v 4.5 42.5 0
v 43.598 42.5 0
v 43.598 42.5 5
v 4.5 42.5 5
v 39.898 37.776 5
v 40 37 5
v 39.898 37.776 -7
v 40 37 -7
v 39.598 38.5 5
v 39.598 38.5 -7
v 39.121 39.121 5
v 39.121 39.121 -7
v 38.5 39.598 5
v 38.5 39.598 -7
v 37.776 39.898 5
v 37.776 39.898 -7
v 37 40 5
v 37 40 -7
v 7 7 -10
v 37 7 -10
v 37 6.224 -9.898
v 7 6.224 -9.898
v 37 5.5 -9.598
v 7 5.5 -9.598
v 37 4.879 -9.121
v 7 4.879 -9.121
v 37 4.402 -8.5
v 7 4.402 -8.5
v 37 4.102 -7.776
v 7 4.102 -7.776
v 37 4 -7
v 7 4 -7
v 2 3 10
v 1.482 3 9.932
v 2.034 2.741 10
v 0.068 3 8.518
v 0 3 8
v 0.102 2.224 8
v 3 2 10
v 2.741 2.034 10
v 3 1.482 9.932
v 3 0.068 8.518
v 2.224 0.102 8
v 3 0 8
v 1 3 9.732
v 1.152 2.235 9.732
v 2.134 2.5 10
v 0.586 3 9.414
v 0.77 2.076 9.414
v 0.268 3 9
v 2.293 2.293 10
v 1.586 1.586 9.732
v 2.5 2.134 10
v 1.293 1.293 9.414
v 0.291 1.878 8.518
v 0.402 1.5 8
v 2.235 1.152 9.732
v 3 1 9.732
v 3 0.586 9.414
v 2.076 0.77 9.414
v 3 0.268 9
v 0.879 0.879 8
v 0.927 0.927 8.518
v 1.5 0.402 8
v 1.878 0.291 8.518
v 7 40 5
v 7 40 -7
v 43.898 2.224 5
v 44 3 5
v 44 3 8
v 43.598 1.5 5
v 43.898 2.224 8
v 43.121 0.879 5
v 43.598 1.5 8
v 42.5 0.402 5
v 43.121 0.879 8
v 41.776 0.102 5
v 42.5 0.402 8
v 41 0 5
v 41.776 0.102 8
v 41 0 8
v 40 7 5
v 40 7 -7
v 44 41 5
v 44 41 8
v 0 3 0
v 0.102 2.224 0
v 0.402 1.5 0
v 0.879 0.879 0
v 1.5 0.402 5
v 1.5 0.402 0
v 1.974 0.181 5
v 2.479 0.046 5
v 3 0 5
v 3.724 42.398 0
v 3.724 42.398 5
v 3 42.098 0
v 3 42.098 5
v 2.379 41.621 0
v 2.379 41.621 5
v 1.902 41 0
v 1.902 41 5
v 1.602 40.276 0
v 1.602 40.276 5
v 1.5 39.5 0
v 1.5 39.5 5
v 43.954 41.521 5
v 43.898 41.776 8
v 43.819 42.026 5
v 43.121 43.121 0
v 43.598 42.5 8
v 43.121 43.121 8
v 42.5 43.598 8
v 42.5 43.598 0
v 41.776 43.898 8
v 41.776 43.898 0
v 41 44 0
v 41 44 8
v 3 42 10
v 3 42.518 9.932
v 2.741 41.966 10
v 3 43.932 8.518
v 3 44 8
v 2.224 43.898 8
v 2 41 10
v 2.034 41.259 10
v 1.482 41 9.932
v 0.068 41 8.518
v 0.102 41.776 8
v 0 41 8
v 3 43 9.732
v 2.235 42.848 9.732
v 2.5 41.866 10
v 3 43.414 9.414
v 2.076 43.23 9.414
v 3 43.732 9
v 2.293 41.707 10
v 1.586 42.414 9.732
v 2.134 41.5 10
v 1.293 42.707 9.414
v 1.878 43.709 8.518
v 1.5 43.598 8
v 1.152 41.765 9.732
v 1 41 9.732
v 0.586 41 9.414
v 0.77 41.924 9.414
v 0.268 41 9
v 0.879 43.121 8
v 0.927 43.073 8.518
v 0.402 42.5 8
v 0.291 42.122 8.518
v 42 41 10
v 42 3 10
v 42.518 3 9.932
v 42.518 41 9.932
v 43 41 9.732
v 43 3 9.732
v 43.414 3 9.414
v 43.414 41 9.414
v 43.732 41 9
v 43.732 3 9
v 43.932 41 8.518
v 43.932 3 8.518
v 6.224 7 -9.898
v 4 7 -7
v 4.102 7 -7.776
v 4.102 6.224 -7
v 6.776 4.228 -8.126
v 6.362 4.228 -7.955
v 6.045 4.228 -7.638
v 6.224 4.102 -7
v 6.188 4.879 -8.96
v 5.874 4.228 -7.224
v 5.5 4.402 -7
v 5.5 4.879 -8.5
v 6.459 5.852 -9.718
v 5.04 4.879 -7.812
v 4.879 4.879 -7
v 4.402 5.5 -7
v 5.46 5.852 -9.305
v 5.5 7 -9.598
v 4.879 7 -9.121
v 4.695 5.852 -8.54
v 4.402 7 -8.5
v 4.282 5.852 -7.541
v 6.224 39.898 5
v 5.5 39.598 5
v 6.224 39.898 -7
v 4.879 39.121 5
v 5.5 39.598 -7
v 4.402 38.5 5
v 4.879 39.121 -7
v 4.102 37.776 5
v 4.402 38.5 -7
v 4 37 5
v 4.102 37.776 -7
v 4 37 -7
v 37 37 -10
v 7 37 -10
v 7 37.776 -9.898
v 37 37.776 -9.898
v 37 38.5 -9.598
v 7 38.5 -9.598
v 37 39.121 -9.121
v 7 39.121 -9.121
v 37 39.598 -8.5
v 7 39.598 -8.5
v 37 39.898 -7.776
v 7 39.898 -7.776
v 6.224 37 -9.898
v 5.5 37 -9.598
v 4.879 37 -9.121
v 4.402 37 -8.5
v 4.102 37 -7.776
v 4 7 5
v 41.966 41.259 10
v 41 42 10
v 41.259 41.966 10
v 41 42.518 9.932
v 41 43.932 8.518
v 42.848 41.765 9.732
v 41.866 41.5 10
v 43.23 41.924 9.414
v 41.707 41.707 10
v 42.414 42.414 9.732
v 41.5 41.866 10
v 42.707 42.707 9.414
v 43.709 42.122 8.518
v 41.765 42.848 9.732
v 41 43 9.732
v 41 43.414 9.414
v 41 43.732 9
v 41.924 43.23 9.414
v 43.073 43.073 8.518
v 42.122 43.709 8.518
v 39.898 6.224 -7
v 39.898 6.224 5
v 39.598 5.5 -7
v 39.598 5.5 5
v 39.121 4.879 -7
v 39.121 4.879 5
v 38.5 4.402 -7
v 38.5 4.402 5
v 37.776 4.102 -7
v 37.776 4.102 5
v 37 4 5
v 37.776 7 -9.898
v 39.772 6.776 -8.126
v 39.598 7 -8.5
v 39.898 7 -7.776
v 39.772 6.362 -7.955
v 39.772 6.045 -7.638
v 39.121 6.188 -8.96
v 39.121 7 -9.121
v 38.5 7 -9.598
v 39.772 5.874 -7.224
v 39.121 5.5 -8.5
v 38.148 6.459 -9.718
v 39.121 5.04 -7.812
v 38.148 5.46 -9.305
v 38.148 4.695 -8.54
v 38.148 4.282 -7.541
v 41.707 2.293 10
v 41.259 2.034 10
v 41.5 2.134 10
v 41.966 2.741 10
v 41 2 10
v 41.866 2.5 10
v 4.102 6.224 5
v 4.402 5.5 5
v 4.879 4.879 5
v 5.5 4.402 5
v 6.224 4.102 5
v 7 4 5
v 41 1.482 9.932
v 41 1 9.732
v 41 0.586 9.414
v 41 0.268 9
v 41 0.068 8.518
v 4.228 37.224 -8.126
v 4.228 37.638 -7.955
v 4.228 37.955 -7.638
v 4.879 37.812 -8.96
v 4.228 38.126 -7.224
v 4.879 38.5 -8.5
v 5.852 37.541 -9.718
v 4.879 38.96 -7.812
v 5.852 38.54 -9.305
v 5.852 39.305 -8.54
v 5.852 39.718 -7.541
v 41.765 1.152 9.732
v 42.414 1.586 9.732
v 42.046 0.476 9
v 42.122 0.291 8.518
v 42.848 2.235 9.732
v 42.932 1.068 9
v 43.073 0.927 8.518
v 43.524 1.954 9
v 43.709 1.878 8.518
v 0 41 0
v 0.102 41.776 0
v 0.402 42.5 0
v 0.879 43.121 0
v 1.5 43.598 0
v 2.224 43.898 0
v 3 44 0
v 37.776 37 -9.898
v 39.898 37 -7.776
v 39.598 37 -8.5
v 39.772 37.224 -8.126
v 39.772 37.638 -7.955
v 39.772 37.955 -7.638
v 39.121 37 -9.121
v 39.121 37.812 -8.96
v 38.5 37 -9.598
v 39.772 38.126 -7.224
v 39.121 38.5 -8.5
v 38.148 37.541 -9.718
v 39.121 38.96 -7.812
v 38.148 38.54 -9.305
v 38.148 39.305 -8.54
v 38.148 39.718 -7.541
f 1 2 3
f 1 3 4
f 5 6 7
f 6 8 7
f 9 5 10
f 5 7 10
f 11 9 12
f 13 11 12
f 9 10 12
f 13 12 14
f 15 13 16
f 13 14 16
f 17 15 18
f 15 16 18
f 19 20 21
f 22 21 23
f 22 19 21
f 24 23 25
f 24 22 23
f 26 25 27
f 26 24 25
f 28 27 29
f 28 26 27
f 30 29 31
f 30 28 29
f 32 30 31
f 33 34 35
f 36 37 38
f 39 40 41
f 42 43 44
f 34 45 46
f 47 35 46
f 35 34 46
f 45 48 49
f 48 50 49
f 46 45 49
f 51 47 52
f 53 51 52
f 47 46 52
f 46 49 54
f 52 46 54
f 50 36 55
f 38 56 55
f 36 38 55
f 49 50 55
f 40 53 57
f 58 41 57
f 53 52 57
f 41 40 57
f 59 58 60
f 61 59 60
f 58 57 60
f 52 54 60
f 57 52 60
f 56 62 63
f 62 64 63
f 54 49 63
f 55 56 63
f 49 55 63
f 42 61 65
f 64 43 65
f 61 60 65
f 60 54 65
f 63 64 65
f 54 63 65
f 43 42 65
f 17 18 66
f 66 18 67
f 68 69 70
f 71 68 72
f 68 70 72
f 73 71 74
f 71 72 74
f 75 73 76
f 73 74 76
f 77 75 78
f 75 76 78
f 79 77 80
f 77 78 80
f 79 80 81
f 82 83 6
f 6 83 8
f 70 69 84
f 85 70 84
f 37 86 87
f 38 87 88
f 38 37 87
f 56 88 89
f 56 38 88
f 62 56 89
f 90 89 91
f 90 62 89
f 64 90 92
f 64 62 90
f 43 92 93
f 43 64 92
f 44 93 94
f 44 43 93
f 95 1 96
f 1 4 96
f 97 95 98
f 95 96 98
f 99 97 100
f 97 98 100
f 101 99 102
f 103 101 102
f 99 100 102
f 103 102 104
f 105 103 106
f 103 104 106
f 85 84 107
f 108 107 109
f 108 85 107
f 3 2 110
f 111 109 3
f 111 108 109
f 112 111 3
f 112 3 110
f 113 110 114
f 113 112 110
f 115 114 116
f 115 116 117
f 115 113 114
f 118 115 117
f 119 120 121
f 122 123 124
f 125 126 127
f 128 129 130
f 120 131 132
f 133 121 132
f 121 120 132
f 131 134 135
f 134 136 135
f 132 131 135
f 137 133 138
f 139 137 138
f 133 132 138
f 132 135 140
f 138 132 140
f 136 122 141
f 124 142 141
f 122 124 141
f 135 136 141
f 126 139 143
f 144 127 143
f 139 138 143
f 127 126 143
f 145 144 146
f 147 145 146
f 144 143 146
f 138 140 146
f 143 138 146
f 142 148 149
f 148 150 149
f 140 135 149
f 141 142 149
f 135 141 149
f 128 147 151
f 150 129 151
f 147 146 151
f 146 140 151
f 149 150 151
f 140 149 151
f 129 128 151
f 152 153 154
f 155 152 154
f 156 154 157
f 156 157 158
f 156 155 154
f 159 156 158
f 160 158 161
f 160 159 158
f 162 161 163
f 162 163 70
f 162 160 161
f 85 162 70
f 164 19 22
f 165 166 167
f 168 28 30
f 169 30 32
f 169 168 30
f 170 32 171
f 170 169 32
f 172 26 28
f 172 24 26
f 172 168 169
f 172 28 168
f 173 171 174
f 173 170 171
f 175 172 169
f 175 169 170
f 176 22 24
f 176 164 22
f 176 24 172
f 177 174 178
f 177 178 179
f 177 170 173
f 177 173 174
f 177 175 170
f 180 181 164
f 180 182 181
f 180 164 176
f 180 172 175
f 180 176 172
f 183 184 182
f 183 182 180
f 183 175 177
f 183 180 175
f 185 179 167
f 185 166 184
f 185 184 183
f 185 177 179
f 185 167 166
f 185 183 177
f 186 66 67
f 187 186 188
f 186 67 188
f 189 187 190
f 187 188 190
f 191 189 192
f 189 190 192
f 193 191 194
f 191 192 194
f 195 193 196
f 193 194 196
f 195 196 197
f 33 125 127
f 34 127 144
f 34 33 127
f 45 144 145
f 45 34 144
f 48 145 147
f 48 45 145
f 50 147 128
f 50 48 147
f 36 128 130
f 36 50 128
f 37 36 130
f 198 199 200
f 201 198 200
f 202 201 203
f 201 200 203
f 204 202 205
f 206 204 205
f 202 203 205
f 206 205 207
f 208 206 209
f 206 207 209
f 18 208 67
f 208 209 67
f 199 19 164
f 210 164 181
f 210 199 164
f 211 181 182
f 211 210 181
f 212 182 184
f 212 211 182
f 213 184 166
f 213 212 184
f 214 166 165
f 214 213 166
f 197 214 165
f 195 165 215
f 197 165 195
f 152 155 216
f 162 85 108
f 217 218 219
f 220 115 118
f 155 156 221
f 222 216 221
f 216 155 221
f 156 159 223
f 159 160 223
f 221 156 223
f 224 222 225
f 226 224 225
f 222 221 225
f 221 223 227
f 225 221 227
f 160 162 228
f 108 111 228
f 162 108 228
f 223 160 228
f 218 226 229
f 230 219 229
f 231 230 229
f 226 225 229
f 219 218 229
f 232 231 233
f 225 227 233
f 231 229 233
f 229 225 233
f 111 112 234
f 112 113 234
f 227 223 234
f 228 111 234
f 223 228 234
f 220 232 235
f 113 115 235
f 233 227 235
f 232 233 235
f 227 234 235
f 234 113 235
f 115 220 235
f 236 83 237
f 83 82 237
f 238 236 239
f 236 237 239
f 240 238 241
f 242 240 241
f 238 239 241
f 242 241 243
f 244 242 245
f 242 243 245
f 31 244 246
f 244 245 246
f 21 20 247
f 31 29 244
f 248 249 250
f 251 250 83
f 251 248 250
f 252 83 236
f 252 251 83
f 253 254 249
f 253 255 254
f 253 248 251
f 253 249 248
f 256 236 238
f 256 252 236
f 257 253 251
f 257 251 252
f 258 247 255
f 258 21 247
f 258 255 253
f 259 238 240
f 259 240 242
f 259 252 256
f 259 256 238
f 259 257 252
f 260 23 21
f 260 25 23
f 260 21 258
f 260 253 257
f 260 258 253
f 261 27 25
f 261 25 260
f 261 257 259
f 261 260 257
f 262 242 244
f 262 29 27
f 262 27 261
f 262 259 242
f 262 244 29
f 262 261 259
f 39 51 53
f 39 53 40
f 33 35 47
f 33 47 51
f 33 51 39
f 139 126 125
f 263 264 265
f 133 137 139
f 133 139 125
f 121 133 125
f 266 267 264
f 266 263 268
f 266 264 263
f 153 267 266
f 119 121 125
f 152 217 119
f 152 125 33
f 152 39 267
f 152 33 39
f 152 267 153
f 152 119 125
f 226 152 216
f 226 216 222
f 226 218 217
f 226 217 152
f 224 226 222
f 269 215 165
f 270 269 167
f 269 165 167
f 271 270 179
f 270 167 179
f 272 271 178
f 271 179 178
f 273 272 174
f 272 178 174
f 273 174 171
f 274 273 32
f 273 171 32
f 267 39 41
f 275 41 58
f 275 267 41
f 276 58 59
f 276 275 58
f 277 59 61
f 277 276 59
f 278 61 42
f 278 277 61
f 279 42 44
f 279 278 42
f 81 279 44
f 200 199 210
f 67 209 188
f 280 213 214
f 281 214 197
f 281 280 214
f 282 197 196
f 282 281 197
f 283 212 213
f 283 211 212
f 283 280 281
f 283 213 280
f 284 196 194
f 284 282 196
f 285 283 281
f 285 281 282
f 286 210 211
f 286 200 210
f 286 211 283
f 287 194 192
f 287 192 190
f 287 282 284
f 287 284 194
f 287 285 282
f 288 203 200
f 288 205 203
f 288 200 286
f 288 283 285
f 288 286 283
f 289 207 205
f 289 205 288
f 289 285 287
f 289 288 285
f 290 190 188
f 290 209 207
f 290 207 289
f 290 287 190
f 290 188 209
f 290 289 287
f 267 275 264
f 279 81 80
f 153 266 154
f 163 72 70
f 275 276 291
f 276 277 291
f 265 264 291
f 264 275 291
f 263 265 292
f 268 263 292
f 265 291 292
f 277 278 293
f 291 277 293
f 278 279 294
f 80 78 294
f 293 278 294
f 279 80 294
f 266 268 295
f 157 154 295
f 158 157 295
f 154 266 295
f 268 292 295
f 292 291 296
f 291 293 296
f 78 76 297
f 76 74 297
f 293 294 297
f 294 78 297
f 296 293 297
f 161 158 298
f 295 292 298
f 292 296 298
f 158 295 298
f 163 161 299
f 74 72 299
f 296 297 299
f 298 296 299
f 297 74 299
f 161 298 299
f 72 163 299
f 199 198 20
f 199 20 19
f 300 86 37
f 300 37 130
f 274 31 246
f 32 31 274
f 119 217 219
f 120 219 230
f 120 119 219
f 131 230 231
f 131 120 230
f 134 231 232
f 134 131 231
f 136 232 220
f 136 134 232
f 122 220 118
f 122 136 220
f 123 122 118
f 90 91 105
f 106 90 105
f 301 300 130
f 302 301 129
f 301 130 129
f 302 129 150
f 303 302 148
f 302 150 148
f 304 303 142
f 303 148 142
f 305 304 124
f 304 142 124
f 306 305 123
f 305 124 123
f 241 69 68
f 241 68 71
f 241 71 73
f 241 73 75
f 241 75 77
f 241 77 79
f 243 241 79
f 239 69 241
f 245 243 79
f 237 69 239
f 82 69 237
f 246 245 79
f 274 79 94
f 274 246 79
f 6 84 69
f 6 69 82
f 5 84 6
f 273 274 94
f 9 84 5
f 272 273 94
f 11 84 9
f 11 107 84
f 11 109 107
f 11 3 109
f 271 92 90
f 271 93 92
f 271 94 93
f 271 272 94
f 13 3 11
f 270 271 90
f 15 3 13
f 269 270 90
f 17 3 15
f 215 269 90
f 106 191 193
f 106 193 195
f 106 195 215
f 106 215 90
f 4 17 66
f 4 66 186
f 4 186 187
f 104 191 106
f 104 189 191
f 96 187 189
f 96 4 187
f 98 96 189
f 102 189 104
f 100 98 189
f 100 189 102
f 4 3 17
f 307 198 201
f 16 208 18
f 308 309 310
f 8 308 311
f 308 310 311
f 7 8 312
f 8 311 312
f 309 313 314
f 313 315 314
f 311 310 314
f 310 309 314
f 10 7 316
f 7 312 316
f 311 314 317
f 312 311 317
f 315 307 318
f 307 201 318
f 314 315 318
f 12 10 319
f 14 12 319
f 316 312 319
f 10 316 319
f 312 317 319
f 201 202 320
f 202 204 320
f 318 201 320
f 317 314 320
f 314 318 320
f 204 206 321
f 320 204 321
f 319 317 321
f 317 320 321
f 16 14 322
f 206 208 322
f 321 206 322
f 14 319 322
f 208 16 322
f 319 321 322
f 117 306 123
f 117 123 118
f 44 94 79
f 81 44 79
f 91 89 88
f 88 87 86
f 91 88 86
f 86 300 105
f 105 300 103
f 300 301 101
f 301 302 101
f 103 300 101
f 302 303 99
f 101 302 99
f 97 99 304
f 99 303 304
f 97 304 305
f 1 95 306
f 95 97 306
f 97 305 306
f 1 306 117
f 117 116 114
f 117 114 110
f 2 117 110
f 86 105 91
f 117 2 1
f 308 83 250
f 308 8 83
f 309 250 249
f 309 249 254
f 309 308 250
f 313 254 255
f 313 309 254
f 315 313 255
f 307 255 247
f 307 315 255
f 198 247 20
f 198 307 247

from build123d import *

# Parameters (mm, degrees)
ESQUISSE2_W             = 44
ESQUISSE2_H             = 44
BOSS_EXTRU_1_DEPTH      = 10
ESQUISSE3_W             = 36
ESQUISSE3_H             = 36
BOSS_EXTRU_2_DEPTH      = 10
ESQUISSE4_W             = 42.5
ESQUISSE4_H             = 42.5
ESQUISSE4_W_2           = 36
ESQUISSE4_H_2           = 36
ENL_V_MAT_EXTRU_1_DEPTH = 5
CONG_1_R                = 3
CONG_2_R                = 2


with BuildPart() as part:
    # Esquisse2 → Boss.-Extru.1 (new body)
    with BuildSketch(Plane.XY):
        with Locations((22, 22)):
            Rectangle(ESQUISSE2_W, ESQUISSE2_H)
    extrude(amount=BOSS_EXTRU_1_DEPTH)

    # Esquisse3 → Boss.-Extru.2 (add)
    with BuildSketch(Plane(origin=(0, 0, 0), x_dir=(-1, 0, 0), z_dir=(0, 0, -1))):
        with Locations((-22, 22)):
            Rectangle(ESQUISSE3_W, ESQUISSE3_H)
    extrude(amount=BOSS_EXTRU_2_DEPTH)

    # Esquisse4 → Enlèv. mat.-Extru.1 (cut)
    with BuildSketch(Plane(origin=(0, 0, 0), x_dir=(-1, 0, 0), z_dir=(0, 0, -1))):
        with Locations((-22.75, 21.25)):
            Rectangle(ESQUISSE4_W, ESQUISSE4_H)
        with Locations((-22, 22)):
            Rectangle(ESQUISSE4_W_2, ESQUISSE4_H_2, mode=Mode.SUBTRACT)
    extrude(amount=-ENL_V_MAT_EXTRU_1_DEPTH, mode=Mode.SUBTRACT)

    # Congé1
    cong_1_edges = [part.edges().sort_by_distance(p)[0] for p in [
        (22, 40, -10),
        (4, 22, -10),
        (22, 4, -10),
        (40, 22, -10),
        (44, 0, 7.5),
        (44, 44, 5),
        (0, 0, 5),
        (0, 44, 5),
        (1.5, 42.5, 2.5),
        (4, 4, -2.5),
        (4, 40, -2.5),
        (40, 4, -2.5),
        (40, 40, -2.5),
    ]]
    fillet(cong_1_edges, radius=CONG_1_R)

    # Congé2
    cong_2_edges = [part.edges().sort_by_distance(p)[0] for p in [
        (44, 22, 10),
        (22, 0, 10),
        (0, 22, 10),
        (22, 44, 10),
        (0.878679656, 43.121320344, 10),
        (0.878679656, 0.878679656, 10),
        (43.121320344, 43.121320344, 10),
        (43.121320344, 0.878679656, 10),
    ]]
    fillet(cong_2_edges, radius=CONG_2_R)


solid = part.part
